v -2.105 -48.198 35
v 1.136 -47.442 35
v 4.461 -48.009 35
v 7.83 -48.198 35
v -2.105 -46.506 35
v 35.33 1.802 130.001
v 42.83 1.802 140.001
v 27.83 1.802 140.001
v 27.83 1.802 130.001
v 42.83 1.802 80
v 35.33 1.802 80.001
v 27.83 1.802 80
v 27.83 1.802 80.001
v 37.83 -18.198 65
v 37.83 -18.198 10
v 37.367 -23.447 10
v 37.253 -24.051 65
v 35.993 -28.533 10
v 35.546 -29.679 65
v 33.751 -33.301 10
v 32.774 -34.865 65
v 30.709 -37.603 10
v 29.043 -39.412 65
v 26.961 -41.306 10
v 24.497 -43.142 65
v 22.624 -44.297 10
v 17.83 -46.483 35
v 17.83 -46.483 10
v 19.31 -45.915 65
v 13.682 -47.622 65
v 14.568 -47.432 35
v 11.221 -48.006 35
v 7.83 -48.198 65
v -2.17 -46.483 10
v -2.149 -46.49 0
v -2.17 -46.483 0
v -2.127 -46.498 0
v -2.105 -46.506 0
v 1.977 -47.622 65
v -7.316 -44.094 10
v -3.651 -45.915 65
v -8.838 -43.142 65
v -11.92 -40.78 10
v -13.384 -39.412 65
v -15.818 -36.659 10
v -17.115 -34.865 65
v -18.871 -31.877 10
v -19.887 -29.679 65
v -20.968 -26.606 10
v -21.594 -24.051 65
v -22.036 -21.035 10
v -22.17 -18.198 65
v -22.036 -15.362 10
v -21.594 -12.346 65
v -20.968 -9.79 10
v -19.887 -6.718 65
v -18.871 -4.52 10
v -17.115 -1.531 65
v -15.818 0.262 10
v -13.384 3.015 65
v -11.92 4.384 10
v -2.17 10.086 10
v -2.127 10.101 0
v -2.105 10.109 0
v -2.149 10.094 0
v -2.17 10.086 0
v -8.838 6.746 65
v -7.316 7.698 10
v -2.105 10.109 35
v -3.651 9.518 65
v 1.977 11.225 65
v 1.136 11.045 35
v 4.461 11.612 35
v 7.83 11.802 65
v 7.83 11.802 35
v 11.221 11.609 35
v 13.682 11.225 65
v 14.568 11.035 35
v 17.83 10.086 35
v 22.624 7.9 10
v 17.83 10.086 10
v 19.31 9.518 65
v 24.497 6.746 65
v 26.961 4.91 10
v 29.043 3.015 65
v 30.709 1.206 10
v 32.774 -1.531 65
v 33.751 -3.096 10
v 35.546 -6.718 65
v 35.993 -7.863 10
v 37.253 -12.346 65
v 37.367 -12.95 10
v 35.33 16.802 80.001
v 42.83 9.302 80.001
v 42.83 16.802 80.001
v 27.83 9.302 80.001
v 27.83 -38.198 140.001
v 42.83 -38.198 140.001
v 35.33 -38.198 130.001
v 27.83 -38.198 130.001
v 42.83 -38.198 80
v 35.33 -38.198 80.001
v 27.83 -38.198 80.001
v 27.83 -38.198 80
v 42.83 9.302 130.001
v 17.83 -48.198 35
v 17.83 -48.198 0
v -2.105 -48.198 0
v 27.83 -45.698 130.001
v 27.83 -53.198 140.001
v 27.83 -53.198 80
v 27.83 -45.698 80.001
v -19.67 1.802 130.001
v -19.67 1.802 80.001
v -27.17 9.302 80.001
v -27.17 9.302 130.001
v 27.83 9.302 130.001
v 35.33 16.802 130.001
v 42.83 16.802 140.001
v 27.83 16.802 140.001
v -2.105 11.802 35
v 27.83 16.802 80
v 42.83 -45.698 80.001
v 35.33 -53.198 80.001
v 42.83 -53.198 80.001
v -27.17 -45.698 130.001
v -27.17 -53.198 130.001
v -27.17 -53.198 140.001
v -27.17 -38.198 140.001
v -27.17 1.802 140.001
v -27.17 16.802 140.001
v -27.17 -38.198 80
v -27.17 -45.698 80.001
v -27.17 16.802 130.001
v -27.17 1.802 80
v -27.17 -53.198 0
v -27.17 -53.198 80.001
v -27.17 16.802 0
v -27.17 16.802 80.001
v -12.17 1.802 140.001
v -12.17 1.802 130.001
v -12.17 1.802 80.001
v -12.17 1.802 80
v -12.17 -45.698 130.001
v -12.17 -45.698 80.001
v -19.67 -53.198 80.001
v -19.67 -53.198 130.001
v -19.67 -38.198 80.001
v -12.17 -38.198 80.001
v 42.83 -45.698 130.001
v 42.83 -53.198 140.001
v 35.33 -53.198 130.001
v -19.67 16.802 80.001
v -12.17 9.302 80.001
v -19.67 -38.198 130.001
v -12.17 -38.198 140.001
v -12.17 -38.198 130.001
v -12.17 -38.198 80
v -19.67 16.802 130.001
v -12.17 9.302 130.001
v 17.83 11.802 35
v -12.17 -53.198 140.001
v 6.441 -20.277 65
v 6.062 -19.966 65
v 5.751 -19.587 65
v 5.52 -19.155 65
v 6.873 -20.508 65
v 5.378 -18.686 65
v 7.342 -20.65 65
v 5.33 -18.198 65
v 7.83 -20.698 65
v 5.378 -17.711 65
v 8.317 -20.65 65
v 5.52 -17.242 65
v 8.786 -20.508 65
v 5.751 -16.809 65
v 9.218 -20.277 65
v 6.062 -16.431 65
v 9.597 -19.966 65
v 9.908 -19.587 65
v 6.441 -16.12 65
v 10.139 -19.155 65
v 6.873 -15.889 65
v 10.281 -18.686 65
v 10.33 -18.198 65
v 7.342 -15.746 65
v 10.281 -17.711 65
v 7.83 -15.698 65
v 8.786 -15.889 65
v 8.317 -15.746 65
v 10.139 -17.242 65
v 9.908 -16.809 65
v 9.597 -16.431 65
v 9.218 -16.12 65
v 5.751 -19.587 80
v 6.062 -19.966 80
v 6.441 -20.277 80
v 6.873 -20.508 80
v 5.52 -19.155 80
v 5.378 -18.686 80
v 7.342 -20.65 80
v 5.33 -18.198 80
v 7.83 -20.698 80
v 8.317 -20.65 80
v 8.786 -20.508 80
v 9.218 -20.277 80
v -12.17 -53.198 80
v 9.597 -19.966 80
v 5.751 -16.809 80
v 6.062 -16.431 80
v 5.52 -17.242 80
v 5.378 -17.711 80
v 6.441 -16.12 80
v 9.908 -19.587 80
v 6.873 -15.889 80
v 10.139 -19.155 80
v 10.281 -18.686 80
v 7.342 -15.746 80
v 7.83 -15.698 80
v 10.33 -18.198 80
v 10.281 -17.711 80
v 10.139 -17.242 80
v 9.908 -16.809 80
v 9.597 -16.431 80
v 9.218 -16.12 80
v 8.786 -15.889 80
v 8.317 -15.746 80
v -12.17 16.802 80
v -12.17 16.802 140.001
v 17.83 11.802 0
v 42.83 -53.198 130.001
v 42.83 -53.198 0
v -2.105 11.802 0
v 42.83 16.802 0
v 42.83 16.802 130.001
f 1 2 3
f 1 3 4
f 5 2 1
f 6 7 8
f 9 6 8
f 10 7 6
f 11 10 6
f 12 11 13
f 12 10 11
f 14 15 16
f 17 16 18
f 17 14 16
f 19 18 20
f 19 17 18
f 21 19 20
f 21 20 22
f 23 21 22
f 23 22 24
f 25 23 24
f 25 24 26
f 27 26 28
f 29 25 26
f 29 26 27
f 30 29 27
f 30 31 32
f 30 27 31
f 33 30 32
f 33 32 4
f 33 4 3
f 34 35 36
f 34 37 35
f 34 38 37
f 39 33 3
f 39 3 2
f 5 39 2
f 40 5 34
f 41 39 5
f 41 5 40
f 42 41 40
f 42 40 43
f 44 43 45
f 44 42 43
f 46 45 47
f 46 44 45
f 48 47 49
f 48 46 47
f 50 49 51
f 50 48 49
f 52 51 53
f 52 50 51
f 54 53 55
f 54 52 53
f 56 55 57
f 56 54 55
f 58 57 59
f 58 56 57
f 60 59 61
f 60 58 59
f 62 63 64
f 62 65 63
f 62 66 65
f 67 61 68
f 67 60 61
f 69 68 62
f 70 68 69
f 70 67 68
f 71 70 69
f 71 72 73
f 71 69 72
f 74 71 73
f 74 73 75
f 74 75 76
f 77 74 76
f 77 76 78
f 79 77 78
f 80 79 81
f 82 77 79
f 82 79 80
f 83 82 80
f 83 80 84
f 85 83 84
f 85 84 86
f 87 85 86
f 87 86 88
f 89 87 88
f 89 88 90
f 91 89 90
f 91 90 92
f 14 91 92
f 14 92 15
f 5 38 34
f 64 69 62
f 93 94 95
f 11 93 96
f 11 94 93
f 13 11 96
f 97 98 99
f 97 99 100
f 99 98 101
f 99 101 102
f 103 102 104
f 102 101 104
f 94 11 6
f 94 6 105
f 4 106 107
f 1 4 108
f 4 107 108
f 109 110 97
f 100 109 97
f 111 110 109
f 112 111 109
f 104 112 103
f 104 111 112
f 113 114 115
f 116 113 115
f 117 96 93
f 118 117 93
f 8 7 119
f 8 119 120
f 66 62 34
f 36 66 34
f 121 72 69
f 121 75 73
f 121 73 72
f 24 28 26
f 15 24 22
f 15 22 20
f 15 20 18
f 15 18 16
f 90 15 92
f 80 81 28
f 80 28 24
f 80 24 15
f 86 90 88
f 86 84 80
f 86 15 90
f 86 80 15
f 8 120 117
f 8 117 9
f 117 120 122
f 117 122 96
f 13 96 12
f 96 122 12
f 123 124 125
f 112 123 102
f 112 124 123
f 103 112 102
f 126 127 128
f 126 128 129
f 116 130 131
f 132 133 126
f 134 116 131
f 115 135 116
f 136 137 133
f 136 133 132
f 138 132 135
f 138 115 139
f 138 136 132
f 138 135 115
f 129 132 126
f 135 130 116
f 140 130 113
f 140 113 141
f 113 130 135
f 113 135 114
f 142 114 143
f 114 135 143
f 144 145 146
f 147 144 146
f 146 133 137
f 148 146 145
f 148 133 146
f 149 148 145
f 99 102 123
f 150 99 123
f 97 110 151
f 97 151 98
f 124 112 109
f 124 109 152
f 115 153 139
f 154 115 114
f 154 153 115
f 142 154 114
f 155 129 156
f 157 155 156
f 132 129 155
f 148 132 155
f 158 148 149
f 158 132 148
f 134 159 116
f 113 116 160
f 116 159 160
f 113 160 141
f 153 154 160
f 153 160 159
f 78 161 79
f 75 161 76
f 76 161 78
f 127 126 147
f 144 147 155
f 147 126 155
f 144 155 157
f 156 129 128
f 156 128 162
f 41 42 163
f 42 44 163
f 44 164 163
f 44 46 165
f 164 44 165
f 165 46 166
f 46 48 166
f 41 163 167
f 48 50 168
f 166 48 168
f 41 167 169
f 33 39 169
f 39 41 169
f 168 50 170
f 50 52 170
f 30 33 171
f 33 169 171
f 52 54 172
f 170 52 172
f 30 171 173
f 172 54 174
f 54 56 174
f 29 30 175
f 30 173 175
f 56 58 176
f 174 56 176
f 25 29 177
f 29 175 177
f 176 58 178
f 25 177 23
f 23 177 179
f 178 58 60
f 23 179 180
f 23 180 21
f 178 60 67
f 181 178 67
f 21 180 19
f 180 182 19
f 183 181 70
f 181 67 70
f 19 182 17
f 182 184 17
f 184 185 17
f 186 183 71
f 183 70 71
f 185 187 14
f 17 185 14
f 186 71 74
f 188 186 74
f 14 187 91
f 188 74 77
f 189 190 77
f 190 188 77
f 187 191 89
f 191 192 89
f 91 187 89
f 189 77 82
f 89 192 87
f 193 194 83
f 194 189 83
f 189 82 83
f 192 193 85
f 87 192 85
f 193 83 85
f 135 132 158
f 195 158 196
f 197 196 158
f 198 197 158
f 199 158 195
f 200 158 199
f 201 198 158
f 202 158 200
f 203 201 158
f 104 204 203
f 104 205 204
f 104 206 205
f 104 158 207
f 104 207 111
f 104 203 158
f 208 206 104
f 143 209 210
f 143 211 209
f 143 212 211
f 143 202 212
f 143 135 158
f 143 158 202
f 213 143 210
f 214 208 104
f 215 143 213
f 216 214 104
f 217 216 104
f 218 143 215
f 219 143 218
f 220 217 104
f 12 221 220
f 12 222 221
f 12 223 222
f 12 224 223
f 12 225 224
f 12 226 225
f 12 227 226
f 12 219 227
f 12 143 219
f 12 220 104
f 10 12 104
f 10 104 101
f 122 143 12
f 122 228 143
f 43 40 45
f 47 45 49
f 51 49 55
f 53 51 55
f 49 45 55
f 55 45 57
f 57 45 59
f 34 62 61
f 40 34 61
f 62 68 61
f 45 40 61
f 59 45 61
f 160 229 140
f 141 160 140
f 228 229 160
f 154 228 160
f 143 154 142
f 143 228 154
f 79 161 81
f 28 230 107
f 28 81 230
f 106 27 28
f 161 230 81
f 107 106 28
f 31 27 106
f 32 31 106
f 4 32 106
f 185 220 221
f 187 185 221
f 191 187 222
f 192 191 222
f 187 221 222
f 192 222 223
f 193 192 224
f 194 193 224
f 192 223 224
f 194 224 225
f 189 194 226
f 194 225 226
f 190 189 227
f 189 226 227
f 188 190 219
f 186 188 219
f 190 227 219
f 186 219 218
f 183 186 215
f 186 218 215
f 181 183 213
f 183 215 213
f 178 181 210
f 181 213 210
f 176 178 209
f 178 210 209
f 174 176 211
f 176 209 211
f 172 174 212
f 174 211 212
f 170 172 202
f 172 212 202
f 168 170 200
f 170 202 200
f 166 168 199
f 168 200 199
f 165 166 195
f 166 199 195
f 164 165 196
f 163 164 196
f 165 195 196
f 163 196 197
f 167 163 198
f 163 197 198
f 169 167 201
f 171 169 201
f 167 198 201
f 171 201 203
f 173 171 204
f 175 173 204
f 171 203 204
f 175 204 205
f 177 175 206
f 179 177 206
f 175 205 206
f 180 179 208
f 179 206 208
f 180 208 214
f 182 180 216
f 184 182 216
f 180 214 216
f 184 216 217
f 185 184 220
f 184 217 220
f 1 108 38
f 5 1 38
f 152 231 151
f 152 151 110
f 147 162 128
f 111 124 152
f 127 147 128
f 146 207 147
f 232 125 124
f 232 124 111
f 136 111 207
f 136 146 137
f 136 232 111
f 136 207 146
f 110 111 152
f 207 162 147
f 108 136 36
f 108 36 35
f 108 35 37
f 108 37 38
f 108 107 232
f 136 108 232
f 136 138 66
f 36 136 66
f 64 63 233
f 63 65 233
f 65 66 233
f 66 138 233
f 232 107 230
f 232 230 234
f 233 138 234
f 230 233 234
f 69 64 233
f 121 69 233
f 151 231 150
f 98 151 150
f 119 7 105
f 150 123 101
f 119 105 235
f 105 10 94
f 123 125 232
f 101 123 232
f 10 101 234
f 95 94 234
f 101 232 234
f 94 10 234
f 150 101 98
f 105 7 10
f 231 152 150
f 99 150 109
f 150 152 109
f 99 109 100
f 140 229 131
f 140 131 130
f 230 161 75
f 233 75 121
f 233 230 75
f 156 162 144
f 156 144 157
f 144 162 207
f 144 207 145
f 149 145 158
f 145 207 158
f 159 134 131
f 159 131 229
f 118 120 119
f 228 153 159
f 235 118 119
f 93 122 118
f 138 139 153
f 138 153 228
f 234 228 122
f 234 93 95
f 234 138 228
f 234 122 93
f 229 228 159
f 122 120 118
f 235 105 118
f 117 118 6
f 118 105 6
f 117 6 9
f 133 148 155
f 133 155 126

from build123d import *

# Parameters (mm, degrees)
SKETCH_1_W               = 70
SKETCH_1_H               = 70
SKETCH_1_W_2             = 40
SKETCH_1_H_2             = 40
EXTRUDE_1_DEPTH          = 80
SKETCH_3_W               = 40
SKETCH_3_H               = 40
EXTRUDE_2_DEPTH          = 15
SKETCH_4_R               = 2.5
CUT_EXTRUDE_1_DEPTH      = 15
SKETCH_5_R               = 30
CUT_EXTRUDE_3_DEPTH      = 70
EXTRUDE_START            = -10
EXTRUDE_4_DEPTH          = 10
SKETCH_8_W               = 19.934341116
SKETCH_8_H               = 60
CUT_EXTRUDE_6_DEPTH      = 35
SKETCH_9_W               = 15
SKETCH_9_H               = 15
EXTRUDE_5_DEPTH          = 0.001
EXTRUDE_6_DEPTH          = 50
SKETCH_11_W              = 15
SKETCH_11_H              = 15
EXTRUDE_7_DEPTH          = 10
PATTERN_CIRCULAR_1_COUNT = 4


with BuildPart() as part:
    # 草图1 → 凸台-拉伸1 (new body)
    with BuildSketch(Plane.XY):
        with Locations((7.829504232, -18.198307134)):
            Rectangle(SKETCH_1_W, SKETCH_1_H)
        with Locations((7.845306404, -19.744690932)):
            Rectangle(SKETCH_1_W_2, SKETCH_1_H_2, mode=Mode.SUBTRACT)
    extrude(amount=EXTRUDE_1_DEPTH)

    # 草图3 → 凸台-拉伸2 (add)
    with BuildSketch(Plane.XY.offset(80)):
        with Locations((7.845306404, -19.744690932)):
            Rectangle(SKETCH_3_W, SKETCH_3_H)
    extrude(amount=-EXTRUDE_2_DEPTH)

    # 草图4 → 切除-拉伸1 (cut)
    with BuildSketch(Plane.XY.offset(80)):
        with Locations((7.829504232, -18.198307134)):
            Circle(SKETCH_4_R)
    extrude(amount=-CUT_EXTRUDE_1_DEPTH, mode=Mode.SUBTRACT)

    # 草图5 → 切除-拉伸3 (cut)
    with BuildSketch(Plane(origin=(0, 0, 65), x_dir=(-1, 0, 0), z_dir=(0, 0, -1))):
        with Locations(Location((-7.829504232, -18.198307134, 0), (0, 0, 180))):
            Circle(SKETCH_5_R)
    extrude(amount=CUT_EXTRUDE_3_DEPTH, mode=Mode.SUBTRACT)

    # 草图7 → 凸台-拉伸4 (add)
    with BuildSketch(Plane(origin=(0, 0, 0), x_dir=(-1, 0, 0), z_dir=(0, 0, -1)).offset(EXTRUDE_START)):
        with BuildLine():
            Line((-17.829504232, 10.085964113), (-17.829504232, -46.482578382))
            ThreePointArc((-17.829504232, -46.482578382), (-37.829504232, -18.198307134), (-17.829504232, 10.085964113))
        make_face()
        with BuildLine():
            Line((2.170495768, 10.085964113), (2.170495768, -46.482578382))
            ThreePointArc((2.170495768, -46.482578382), (22.170495768, -18.198307134), (2.170495768, 10.085964113))
        make_face()
    extrude(amount=EXTRUDE_4_DEPTH)

    # 草图8 → 切除-拉伸6 (cut)
    with BuildSketch(Plane(origin=(0, 0, 0), x_dir=(-1, 0, 0), z_dir=(0, 0, -1))):
        with Locations((-7.862333674, -18.198307134)):
            Rectangle(SKETCH_8_W, SKETCH_8_H)
    extrude(amount=-CUT_EXTRUDE_6_DEPTH, mode=Mode.SUBTRACT)

    # 草图9 → 凸台-拉伸5 (add)
    with BuildSketch(Plane.XY.offset(80)):
        with Locations((-19.670495768, -45.698307134)):
            Rectangle(SKETCH_9_W, SKETCH_9_H)
    extrude_5 = extrude(amount=EXTRUDE_5_DEPTH)

    # 草图10 → 凸台-拉伸6 (add)
    with BuildSketch(Plane.XY.offset(80.001)):
        Polygon((-27.170495768, -38.198307134), (-19.670495768, -38.198307134), (-27.170495768, -45.698307134), align=None)
        Polygon((-19.670495768, -53.198307134), (-12.170495768, -53.198307134), (-12.170495768, -45.698307134), align=None)
    extrude_6 = extrude(amount=EXTRUDE_6_DEPTH)

    # 草图11 → 凸台-拉伸7 (add)
    with BuildSketch(Plane.XY.offset(130.001)):
        with Locations((-19.670495768, -45.698307134)):
            Rectangle(SKETCH_11_W, SKETCH_11_H)
    extrude_7 = extrude(amount=EXTRUDE_7_DEPTH)

    # 阵列(圆周)1: 凸台-拉伸5, 凸台-拉伸6, 凸台-拉伸7 ×4 about axis
    pattern_circular_1_axis = Axis((7.829504232, -18.198307134, 0), (0, 0, 1))
    add([extrude_5.rotate(pattern_circular_1_axis, i * 360 / PATTERN_CIRCULAR_1_COUNT) for i in range(1, PATTERN_CIRCULAR_1_COUNT)])
    add([extrude_6.rotate(pattern_circular_1_axis, i * 360 / PATTERN_CIRCULAR_1_COUNT) for i in range(1, PATTERN_CIRCULAR_1_COUNT)])
    add([extrude_7.rotate(pattern_circular_1_axis, i * 360 / PATTERN_CIRCULAR_1_COUNT) for i in range(1, PATTERN_CIRCULAR_1_COUNT)])


solid = part.part
